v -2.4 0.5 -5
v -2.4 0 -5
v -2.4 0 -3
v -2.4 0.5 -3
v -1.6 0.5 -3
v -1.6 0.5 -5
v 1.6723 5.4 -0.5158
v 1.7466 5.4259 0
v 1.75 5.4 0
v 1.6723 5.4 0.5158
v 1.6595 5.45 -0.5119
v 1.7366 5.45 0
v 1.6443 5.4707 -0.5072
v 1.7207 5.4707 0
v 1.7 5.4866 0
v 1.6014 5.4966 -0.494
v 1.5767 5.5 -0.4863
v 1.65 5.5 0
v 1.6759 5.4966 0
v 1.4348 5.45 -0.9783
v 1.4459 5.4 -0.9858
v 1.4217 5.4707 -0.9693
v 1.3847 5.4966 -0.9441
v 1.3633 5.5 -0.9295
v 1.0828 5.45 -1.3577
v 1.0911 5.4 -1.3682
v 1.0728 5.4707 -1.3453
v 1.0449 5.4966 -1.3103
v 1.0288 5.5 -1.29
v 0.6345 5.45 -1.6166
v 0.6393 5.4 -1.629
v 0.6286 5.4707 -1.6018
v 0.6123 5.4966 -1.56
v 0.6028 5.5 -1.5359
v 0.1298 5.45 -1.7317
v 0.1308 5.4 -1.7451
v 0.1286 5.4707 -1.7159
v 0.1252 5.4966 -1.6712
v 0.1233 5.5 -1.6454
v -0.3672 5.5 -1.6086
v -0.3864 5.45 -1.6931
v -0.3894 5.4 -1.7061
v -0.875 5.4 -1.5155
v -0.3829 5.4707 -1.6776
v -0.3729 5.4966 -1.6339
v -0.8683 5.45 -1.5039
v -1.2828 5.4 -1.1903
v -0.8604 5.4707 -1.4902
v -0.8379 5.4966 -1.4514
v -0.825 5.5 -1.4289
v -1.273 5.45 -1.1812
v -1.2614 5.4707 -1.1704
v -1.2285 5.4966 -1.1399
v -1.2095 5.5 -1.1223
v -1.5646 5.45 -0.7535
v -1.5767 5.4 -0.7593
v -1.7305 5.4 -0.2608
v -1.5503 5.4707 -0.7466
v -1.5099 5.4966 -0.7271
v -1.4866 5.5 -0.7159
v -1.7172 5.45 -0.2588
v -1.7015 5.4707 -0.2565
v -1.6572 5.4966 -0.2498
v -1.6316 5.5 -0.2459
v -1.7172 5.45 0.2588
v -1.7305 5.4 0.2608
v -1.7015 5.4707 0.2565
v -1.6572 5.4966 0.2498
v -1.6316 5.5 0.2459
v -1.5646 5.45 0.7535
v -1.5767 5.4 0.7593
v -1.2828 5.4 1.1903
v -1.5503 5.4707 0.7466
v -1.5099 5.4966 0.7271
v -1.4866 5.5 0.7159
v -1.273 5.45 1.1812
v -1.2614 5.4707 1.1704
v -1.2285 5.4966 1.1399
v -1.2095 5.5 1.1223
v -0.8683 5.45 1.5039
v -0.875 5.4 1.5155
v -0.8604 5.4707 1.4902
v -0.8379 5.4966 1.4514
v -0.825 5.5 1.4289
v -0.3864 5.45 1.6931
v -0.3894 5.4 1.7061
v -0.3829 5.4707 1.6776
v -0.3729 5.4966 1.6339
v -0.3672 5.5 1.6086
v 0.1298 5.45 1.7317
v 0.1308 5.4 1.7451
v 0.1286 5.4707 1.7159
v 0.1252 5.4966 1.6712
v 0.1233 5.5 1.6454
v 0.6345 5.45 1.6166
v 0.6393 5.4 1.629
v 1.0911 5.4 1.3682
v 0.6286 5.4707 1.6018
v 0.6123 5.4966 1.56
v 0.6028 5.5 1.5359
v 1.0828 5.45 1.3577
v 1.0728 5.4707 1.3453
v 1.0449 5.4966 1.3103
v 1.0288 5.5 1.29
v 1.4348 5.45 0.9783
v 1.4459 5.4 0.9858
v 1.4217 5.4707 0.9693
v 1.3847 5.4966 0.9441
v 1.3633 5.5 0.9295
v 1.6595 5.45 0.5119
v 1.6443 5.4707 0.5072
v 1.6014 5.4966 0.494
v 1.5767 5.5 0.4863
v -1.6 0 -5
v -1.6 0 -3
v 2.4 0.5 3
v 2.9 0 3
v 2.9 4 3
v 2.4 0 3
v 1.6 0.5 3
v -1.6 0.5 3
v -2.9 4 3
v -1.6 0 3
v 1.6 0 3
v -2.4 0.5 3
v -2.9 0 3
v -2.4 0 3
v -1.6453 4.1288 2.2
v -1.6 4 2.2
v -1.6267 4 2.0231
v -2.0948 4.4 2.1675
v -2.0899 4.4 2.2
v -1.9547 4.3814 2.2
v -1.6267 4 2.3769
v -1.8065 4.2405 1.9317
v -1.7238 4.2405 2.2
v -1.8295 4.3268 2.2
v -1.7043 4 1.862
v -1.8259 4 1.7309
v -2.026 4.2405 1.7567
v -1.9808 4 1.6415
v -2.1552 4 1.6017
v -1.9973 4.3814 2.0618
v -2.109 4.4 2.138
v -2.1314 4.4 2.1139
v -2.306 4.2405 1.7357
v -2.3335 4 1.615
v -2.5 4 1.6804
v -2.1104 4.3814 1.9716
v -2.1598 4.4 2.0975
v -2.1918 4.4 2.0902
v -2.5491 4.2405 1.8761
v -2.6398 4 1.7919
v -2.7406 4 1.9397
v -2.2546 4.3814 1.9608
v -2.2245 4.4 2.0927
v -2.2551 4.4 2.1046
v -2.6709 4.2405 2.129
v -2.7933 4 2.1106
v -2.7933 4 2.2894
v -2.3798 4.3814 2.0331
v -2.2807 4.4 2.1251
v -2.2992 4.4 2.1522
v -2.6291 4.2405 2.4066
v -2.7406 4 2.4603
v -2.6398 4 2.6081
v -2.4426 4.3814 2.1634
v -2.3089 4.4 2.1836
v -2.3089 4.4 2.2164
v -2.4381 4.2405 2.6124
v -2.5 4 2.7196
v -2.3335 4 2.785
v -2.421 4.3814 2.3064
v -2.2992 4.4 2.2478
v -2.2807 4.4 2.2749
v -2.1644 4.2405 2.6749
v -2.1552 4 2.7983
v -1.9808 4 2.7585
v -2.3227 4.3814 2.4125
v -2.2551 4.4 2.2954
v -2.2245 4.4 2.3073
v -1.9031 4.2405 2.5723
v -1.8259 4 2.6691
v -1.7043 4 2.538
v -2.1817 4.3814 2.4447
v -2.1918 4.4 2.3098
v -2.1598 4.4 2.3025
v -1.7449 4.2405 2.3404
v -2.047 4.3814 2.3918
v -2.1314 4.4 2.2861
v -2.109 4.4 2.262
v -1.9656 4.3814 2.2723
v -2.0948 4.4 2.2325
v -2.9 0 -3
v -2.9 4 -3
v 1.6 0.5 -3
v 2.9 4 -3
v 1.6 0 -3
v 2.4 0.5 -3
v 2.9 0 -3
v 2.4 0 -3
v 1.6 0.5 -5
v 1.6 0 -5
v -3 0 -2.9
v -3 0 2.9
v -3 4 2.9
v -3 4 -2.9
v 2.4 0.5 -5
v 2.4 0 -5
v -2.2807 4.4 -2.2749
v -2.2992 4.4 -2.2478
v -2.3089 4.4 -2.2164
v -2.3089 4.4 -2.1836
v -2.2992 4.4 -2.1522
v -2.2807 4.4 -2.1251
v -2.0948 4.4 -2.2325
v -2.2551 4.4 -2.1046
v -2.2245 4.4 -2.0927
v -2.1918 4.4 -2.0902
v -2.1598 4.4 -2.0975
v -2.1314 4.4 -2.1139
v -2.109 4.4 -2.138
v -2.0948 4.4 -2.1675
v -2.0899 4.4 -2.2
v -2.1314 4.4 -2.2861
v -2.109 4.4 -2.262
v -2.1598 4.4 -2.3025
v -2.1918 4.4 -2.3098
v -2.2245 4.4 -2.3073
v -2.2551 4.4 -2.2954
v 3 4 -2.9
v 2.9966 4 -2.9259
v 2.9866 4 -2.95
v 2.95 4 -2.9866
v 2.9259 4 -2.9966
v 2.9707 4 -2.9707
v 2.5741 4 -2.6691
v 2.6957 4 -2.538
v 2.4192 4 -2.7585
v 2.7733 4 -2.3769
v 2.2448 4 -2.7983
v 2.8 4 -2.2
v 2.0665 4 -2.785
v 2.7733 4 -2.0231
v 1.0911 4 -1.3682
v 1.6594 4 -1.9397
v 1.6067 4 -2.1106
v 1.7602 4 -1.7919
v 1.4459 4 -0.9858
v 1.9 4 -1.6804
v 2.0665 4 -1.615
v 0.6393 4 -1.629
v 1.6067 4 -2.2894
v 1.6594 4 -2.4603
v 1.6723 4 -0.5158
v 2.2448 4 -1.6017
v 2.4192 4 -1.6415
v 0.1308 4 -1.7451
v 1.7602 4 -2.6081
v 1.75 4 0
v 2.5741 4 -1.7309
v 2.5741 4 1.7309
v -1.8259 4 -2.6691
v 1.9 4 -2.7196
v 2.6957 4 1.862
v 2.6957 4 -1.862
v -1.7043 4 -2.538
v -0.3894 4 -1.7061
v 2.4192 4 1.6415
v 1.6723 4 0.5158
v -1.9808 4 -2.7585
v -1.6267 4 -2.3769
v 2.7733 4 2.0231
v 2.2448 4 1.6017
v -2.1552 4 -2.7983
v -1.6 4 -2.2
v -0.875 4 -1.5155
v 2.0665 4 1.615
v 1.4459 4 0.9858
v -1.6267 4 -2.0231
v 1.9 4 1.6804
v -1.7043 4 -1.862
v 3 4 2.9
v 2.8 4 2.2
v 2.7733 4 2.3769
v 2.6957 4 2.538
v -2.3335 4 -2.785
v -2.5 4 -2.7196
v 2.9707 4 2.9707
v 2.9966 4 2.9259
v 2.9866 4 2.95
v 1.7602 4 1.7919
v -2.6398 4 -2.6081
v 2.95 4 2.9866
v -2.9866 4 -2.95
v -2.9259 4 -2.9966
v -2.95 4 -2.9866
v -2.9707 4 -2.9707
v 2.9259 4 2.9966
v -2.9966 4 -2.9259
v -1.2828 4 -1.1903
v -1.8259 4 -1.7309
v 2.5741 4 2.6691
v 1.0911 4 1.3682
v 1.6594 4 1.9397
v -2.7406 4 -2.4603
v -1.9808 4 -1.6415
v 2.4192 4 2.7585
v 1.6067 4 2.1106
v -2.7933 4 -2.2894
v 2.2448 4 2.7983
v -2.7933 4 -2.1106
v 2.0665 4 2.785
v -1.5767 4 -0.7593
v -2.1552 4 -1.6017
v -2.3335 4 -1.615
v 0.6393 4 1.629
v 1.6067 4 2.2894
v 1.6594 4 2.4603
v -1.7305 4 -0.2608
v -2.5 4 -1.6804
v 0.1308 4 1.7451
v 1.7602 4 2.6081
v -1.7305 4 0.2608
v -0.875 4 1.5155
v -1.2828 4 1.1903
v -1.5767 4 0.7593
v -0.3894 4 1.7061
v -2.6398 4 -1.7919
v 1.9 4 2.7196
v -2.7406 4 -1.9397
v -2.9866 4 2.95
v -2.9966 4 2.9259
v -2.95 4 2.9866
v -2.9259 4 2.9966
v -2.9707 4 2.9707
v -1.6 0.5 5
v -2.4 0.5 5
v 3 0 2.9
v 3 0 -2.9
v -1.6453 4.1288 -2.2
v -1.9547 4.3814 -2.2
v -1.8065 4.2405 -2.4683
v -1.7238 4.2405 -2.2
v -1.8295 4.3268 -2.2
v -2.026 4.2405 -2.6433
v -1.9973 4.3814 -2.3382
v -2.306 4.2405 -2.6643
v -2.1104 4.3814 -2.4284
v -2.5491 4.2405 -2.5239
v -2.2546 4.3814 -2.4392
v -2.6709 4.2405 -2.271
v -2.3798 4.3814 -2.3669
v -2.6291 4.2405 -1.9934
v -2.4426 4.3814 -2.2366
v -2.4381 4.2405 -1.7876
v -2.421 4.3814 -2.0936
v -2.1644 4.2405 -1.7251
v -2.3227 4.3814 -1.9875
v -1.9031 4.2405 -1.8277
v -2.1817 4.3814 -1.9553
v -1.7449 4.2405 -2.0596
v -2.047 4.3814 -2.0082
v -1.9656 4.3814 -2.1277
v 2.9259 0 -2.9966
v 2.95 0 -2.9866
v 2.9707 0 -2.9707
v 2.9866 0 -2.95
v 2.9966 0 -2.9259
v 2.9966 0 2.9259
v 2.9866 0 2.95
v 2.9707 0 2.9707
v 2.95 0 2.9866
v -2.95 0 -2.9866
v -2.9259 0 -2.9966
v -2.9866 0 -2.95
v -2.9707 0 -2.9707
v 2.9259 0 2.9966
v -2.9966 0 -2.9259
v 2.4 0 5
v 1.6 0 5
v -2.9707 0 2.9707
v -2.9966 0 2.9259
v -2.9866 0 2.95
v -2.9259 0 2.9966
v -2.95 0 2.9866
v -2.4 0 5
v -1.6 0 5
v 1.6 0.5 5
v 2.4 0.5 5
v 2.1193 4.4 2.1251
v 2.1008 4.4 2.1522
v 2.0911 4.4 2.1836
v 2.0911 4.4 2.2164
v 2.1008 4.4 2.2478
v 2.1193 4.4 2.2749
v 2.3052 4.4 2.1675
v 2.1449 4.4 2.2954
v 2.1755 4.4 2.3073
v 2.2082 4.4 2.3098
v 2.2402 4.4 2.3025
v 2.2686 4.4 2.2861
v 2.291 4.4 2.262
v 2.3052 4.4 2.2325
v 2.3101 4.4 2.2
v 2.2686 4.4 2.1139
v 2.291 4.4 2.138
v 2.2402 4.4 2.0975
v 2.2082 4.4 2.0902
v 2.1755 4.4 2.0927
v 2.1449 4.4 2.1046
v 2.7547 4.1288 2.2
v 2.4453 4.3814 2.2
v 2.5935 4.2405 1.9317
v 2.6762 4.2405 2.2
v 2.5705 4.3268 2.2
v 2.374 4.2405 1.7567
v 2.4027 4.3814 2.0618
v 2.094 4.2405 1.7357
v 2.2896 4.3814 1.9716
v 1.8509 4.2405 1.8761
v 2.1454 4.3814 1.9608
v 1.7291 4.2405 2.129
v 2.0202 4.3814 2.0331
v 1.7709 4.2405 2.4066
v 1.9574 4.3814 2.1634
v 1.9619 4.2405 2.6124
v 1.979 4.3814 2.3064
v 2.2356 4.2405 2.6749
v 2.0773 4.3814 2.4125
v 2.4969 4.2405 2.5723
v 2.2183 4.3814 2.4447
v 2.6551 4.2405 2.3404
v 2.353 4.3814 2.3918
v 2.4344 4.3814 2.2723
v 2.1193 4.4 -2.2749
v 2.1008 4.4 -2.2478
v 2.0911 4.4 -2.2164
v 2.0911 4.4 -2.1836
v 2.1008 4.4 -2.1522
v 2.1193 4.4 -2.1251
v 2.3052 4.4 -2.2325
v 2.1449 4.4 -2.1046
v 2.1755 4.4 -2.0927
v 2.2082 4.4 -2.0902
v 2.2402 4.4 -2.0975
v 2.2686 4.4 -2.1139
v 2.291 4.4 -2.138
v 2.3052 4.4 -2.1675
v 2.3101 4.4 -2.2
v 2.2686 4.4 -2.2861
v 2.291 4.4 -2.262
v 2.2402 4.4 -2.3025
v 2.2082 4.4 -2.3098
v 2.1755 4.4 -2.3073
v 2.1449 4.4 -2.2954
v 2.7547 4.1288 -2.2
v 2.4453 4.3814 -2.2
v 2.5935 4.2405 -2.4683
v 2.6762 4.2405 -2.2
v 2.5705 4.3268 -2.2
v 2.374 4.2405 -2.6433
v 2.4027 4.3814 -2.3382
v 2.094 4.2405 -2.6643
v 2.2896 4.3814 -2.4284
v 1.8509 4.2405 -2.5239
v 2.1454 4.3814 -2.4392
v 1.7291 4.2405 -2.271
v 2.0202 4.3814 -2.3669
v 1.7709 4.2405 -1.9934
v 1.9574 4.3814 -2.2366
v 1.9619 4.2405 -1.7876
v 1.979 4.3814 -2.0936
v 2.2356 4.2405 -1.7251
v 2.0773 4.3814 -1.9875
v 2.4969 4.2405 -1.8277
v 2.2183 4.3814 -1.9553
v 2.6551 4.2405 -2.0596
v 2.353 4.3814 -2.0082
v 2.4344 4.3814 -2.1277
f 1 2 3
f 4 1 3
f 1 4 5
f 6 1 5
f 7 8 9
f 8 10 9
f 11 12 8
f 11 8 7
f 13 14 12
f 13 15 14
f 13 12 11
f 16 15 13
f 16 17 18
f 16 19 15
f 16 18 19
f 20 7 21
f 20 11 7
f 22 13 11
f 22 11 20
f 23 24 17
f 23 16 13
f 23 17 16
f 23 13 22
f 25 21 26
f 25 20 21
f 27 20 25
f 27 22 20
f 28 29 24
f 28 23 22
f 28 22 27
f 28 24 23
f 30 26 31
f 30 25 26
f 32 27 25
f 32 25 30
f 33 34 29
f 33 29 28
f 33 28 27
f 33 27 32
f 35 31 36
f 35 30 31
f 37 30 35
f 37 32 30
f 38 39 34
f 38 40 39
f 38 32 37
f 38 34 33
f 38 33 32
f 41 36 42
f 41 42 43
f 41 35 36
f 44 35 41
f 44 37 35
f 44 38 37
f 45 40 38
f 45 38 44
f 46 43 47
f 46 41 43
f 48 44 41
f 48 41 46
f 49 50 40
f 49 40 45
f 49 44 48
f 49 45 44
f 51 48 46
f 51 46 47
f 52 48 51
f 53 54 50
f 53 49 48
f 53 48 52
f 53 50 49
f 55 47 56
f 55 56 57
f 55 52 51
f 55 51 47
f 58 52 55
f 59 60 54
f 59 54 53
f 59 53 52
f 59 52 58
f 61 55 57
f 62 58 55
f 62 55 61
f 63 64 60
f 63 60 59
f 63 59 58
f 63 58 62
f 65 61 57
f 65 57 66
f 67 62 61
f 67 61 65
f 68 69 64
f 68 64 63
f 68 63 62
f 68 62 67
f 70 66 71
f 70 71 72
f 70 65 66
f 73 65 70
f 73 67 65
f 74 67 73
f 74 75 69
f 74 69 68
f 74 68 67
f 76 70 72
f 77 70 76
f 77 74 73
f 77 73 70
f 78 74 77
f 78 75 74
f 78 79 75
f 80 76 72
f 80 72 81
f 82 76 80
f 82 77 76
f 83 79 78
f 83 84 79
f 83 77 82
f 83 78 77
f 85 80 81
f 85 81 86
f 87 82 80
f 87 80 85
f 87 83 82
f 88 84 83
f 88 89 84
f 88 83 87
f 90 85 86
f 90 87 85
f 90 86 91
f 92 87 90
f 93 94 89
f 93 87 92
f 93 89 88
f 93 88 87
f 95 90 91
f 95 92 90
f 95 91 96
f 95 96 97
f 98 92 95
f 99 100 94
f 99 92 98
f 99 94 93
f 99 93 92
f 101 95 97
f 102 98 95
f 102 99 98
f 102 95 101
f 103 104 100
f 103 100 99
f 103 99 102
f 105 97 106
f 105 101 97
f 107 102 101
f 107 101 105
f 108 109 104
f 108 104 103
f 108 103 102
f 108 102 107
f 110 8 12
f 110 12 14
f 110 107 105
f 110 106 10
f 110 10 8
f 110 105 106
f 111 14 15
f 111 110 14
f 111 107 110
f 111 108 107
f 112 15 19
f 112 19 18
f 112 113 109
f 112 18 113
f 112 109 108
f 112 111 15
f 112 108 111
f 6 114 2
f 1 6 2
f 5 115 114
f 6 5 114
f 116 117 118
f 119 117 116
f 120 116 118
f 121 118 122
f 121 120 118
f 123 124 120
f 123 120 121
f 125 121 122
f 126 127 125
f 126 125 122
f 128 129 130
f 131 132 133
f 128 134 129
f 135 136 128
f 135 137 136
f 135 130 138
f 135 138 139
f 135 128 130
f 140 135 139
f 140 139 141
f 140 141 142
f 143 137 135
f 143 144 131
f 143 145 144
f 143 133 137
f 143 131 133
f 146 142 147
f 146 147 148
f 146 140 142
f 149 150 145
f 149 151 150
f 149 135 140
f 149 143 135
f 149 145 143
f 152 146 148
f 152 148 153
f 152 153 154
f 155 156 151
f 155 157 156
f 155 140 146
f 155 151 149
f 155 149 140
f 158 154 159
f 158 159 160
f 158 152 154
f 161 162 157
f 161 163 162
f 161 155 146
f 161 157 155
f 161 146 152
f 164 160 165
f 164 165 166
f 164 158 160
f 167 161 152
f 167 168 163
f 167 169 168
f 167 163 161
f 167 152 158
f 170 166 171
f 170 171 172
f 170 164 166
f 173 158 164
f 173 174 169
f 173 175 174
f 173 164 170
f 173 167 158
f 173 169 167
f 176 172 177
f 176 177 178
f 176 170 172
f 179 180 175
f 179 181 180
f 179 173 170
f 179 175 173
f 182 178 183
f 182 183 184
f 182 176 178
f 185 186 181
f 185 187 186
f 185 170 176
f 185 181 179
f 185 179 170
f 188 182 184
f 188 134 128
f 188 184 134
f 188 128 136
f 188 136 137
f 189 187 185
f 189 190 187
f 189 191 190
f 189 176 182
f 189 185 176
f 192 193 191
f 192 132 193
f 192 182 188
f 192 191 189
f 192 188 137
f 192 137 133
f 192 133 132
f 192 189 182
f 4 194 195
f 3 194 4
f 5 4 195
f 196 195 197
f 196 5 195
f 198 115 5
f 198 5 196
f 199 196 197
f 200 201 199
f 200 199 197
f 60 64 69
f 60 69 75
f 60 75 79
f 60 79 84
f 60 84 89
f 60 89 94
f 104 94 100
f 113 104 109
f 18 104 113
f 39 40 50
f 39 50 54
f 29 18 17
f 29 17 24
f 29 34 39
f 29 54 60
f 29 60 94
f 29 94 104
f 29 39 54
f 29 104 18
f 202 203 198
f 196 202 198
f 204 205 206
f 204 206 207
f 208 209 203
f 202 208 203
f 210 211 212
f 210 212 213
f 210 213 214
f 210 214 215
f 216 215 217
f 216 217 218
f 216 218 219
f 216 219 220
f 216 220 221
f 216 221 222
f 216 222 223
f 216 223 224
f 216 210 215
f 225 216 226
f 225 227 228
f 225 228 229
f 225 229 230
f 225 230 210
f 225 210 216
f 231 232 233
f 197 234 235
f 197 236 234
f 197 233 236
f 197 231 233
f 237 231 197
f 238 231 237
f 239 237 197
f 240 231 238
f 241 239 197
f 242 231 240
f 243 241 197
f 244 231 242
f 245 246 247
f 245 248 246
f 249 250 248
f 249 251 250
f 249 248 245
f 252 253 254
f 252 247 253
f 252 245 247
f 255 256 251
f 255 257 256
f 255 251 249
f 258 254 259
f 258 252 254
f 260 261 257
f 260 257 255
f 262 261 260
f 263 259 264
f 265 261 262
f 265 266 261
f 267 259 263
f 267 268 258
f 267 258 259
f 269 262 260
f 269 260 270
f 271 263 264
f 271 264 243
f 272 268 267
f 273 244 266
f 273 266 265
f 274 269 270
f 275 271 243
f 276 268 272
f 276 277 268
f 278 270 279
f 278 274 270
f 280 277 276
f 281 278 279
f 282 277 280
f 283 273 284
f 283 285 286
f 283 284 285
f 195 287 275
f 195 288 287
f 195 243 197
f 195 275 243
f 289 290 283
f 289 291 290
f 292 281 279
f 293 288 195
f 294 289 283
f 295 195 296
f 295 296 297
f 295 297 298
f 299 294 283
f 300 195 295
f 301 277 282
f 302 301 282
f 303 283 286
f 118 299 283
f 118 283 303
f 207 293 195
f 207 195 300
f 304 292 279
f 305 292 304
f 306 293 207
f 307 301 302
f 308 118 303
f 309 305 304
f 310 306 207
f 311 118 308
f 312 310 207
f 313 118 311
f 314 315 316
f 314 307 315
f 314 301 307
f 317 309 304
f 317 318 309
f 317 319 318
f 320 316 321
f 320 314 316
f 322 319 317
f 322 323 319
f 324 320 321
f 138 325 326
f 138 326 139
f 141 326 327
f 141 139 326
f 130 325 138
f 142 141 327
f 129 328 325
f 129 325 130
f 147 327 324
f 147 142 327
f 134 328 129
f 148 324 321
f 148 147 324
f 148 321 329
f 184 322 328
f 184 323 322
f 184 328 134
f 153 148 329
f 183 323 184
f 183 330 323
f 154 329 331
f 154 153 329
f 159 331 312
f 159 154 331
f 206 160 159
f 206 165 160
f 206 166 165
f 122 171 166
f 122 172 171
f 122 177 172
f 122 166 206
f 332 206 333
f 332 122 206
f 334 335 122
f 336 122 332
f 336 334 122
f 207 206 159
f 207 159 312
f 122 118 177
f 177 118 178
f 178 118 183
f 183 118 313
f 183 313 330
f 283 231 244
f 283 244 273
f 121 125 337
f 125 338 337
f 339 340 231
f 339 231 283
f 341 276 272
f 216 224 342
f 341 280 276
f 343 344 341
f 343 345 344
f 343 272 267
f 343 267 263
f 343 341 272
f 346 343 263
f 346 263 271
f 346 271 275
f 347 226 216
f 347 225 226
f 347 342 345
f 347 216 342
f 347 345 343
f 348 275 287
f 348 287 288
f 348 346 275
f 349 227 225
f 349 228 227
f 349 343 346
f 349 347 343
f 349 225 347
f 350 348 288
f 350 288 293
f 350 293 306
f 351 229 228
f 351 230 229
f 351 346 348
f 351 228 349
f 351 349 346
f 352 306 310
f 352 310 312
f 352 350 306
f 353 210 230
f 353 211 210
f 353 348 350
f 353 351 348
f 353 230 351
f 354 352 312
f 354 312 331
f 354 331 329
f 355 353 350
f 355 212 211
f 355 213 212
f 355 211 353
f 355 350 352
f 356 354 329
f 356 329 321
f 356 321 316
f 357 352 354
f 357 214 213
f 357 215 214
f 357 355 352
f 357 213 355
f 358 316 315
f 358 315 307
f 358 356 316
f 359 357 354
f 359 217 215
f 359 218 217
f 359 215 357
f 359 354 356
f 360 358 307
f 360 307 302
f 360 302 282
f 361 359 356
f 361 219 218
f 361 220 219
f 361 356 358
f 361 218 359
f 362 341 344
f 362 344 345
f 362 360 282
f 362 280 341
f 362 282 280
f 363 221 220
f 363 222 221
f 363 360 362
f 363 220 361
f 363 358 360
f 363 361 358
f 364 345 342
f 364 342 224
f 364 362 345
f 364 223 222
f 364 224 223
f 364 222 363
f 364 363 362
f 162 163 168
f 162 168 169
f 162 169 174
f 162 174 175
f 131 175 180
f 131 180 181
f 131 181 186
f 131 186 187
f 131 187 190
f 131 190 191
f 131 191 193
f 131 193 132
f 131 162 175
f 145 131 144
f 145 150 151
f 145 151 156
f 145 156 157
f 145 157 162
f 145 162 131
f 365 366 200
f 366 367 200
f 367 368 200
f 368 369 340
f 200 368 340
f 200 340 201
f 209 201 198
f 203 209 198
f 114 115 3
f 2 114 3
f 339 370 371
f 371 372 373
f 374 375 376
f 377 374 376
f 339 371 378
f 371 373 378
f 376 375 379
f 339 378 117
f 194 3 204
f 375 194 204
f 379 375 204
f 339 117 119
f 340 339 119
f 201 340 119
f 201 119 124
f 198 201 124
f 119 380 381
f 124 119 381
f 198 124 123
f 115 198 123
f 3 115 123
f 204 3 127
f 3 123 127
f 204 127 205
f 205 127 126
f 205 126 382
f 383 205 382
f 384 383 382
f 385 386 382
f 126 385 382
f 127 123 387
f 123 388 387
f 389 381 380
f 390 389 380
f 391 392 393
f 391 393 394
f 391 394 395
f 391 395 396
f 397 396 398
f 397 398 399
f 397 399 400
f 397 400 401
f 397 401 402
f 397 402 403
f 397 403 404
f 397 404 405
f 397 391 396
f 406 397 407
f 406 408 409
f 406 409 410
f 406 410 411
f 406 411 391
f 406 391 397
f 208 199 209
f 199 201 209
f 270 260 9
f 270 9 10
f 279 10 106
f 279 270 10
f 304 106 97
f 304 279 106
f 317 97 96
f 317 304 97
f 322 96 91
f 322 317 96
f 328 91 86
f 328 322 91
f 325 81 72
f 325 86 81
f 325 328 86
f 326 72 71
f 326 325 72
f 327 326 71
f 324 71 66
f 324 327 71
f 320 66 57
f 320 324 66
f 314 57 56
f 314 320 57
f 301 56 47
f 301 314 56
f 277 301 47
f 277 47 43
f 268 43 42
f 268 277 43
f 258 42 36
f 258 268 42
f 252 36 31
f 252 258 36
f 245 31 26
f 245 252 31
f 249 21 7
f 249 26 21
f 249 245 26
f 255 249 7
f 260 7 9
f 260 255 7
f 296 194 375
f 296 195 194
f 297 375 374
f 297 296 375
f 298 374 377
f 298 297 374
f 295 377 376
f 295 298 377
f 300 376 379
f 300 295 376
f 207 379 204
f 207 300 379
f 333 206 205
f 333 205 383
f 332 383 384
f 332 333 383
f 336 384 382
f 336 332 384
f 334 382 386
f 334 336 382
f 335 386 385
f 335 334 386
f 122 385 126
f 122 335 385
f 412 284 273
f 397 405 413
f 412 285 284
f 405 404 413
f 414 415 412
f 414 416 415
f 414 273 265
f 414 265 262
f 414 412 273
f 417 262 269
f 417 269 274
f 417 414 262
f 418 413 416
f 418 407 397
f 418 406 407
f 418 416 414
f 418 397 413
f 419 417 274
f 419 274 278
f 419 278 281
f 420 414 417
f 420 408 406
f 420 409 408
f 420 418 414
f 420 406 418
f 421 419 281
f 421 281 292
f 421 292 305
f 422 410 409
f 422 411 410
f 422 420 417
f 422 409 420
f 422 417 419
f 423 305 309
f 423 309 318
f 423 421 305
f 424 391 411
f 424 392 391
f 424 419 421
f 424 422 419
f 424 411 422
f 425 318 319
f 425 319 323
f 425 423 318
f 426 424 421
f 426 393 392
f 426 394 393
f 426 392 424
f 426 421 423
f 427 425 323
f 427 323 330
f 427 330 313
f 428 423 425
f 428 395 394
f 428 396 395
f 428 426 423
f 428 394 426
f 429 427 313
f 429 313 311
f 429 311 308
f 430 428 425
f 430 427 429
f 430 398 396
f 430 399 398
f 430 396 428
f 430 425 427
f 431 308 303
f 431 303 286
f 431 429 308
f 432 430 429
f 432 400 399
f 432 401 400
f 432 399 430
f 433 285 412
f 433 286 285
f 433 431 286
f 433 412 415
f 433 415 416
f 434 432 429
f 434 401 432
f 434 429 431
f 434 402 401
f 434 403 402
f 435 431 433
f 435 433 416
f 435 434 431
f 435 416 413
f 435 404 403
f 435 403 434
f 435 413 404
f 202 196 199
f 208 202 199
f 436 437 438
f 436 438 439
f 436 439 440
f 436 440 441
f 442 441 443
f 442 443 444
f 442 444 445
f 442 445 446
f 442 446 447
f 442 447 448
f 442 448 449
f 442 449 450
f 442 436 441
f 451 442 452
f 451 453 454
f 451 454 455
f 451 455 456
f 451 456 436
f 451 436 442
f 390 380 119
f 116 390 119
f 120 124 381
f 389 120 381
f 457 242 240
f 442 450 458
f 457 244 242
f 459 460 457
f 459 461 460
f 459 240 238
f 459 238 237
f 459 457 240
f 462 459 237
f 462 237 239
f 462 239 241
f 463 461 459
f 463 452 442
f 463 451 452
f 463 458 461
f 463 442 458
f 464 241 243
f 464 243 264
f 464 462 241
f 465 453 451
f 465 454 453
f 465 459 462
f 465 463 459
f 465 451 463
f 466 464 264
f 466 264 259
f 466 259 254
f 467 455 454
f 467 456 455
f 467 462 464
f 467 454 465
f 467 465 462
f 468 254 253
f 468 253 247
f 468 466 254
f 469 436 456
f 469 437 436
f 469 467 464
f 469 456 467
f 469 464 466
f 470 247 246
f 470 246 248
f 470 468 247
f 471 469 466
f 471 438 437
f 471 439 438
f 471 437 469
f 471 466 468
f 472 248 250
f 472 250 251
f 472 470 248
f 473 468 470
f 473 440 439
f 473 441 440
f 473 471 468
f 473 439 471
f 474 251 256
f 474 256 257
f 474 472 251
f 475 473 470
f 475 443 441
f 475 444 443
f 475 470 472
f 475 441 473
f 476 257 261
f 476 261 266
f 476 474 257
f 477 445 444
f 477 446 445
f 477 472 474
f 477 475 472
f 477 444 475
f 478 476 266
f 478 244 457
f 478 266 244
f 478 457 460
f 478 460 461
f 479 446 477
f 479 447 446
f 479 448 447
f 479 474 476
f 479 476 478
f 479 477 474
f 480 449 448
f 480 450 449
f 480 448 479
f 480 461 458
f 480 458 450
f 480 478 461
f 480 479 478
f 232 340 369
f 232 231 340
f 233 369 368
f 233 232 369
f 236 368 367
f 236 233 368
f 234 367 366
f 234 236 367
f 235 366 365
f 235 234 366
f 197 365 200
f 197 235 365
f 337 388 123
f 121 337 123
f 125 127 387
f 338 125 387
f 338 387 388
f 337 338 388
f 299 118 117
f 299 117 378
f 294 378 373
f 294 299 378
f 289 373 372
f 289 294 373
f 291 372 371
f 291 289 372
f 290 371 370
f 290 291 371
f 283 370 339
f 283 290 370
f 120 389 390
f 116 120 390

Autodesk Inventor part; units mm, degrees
ref_plane "YZ Plane" through (0, 0, 0) normal (1, 0, 0) x (0, 1, 0)
ref_plane "XZ Plane" through (0, 0, 0) normal (0, 1, 0) x (-1, 0, 0)
ref_plane "XY Plane" through (0, 0, 0) normal (0, 0, 1) x (1, 0, 0)
sketch "Esquisse1" plane through (0, 0, 0) normal (0, 1, 0) x (-1, 0, 0)
  line L0 (3, -3) -> (-3, -3)
  line L1 (-3, -3) -> (-3, 3)
  line L2 (-3, 3) -> (3, 3)
  line L3 (3, 3) -> (3, -3)
  point P0 (0, 0)
  dimension "d0" = 3
  dimension "d1" = 6
  dimension "d2" = 6
  dimension "d3" = 3
extrude "Extrusion1" add sketch "Esquisse1" along normal blind 4
sketch "Esquisse2" plane through (0, 4, 0) normal (0, 1, 0) x (1, 0, 0)
  circle A0 centre (0, 0) radius 1.75
  dimension "d6" = 3.5
extrude "Extrusion2" add sketch "Esquisse2" along normal blind 1.5
sketch "Esquisse3" plane through (0, 4, 0) normal (0, 1, 0) x (1, 0, 0)
  circle A0 centre (-2.2, -2.2) radius 0.6
  line L0 (-3, -3) -> (3, -3) projected
  line L1 (-3, 3) -> (-3, -3) projected
  circle A1 centre (2.2, -2.2) radius 0.6
  circle A2 centre (-2.2, 2.2) radius 0.6
  circle A3 centre (2.2, 2.2) radius 0.6
  point P0 (0, 0)
  dimension "d9" = 0.8
  dimension "d10" = 0.8
  dimension "d11" = 1.2
  dimension "d14" = 4.4
  dimension "d17" = 4.4
extrude "Extrusion3" add sketch "Esquisse3" along normal blind 0.4
sketch "Esquisse4" plane through (0, 0, 0) normal (0, -1, 0) x (1, 0, 0)
  line L0 (-3, 3) -> (3, 3) projected
  line L1 (2.4, 3) -> (1.6, 3)
  line L2 (1.6, 3) -> (1.6, 5)
  line L3 (1.6, 5) -> (2.4, 5)
  line L4 (2.4, 5) -> (2.4, 3)
  line L5 (3, -3) -> (3, 3) projected
  line L6 (2.4, -5) -> (1.6, -5)
  line L7 (1.6, -5) -> (1.6, -3)
  line L8 (1.6, -3) -> (2.4, -3)
  line L9 (2.4, -3) -> (2.4, -5)
  line L10 (-1.6, 3) -> (-2.4, 3)
  line L11 (-2.4, 3) -> (-2.4, 5)
  line L12 (-2.4, 5) -> (-1.6, 5)
  line L13 (-1.6, 5) -> (-1.6, 3)
  line L14 (-1.6, -5) -> (-2.4, -5)
  line L15 (-2.4, -5) -> (-2.4, -3)
  line L16 (-2.4, -3) -> (-1.6, -3)
  line L17 (-1.6, -3) -> (-1.6, -5)
  point P0 (0, 0)
  dimension "d22" = 2
  dimension "d23" = 0.8
  dimension "d24" = 0.6
  dimension "d27" = 8
  dimension "d30" = 4
extrude "Extrusion4" add sketch "Esquisse4" against normal blind 0.5
fillet "Congé1" radius 0.5 4 edges at (1.6, 4.4, 2.2) (-2.8, 4.4, 2.2) (-2.8, 4.4, -2.2) (1.6, 4.4, -2.2)
fillet "Congé2" radius 0.1 1 edges at (-1.75, 5.5, 0)
fillet "Congé3" radius 0.1 4 edges at (3, 2, 3) (3, 2, -3) (-3, 2, -3) (-3, 2, 3)
equation "\"d0\" = 0.5 * d1"
equation "\"d3\" = 0.5 * d2"
equation "\"d10\" = d9"
properties part number "Touch Button"
